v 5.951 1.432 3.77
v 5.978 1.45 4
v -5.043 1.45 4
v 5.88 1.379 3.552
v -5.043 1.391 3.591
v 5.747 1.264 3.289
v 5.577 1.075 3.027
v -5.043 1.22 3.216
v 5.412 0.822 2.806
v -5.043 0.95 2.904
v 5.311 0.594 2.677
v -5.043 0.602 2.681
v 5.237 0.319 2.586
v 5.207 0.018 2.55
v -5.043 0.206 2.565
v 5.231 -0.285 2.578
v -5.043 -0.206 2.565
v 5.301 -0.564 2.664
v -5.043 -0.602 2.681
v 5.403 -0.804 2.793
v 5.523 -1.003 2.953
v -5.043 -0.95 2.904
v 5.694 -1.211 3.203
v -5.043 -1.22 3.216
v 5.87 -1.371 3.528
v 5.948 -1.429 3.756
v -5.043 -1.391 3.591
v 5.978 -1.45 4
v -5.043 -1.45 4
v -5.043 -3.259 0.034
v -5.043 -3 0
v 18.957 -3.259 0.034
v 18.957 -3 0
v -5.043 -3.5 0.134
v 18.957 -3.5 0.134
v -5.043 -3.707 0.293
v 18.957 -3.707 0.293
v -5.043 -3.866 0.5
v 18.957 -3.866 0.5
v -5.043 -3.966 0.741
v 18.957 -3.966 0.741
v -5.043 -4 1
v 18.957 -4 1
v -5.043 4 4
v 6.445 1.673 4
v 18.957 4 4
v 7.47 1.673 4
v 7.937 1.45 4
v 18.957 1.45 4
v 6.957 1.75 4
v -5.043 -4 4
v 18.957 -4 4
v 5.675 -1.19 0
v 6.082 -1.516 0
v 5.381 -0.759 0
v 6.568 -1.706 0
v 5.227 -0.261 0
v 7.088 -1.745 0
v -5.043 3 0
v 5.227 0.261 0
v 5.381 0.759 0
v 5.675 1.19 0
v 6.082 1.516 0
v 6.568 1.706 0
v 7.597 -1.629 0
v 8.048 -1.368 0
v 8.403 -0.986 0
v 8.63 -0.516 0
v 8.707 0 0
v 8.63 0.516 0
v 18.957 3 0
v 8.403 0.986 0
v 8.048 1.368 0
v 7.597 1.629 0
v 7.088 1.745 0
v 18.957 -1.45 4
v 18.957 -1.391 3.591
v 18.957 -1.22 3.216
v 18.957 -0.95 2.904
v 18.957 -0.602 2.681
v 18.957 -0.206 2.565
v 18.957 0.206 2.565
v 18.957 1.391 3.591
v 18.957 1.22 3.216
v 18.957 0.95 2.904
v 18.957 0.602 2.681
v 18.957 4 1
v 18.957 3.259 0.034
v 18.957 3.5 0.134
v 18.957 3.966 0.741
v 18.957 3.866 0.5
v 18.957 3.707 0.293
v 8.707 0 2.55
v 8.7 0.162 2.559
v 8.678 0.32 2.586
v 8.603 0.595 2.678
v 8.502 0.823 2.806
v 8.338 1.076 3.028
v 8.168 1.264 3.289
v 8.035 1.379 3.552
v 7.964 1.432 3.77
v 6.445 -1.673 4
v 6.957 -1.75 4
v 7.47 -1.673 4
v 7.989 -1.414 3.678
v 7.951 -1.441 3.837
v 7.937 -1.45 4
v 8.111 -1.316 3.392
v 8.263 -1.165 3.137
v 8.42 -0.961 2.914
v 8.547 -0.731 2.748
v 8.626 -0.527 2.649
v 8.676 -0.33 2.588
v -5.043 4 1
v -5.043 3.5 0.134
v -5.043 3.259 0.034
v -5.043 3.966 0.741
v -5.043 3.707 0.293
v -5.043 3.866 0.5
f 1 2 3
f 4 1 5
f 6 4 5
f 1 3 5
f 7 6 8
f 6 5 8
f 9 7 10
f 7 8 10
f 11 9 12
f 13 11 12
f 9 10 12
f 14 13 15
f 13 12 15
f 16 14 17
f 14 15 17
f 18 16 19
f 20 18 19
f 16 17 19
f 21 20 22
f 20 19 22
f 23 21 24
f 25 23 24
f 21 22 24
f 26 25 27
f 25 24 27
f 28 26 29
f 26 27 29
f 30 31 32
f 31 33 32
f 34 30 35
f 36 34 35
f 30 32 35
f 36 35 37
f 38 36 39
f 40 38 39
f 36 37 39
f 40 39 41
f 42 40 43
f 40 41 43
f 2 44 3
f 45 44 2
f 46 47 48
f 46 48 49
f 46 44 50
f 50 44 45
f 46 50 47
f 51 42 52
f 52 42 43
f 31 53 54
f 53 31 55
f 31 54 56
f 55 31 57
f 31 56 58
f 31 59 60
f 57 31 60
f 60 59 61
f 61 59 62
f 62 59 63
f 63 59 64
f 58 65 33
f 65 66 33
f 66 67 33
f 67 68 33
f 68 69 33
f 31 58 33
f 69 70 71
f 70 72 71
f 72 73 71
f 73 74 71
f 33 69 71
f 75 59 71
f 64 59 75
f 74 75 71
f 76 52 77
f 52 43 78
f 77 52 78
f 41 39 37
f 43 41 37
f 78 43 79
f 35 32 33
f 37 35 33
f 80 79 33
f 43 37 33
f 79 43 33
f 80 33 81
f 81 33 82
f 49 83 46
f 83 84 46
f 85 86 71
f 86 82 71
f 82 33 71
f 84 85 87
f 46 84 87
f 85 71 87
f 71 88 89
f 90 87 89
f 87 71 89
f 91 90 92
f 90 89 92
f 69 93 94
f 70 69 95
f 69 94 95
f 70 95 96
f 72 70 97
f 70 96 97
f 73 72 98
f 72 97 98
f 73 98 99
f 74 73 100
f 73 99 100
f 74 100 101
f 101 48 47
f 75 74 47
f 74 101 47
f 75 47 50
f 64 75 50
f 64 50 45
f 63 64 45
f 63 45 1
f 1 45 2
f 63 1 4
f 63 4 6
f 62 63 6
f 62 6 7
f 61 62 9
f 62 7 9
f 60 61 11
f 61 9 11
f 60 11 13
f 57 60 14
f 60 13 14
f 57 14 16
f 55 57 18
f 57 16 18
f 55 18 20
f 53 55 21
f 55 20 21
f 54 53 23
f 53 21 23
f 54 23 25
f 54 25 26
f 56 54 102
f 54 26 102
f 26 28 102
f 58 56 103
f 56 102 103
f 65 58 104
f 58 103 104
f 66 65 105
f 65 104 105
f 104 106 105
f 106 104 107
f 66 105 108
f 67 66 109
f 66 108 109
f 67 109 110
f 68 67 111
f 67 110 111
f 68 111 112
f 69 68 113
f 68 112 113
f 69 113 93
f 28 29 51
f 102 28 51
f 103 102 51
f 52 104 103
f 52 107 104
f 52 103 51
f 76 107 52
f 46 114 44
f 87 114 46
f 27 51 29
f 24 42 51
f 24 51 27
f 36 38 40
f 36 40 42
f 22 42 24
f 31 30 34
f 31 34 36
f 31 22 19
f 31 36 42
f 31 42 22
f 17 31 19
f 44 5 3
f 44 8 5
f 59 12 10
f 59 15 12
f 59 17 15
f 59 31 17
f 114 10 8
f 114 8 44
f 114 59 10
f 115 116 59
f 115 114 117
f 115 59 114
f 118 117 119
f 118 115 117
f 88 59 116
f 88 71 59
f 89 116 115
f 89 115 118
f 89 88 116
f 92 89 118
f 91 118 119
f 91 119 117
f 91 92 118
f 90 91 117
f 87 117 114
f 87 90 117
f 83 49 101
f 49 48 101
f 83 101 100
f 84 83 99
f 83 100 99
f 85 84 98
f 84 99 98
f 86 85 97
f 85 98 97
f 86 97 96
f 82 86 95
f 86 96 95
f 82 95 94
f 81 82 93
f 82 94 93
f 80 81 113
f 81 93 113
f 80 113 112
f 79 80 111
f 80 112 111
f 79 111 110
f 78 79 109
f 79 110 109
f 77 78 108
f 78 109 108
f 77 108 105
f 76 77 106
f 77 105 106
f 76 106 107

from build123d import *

# Parameters (mm, degrees)
SKETCH2_W           = 24
SKETCH2_H           = 8
BOSS_EXTRUDE1_DEPTH = 4
SKETCH3_R           = 1.75
CUT_EXTRUDE1_DEPTH  = 5
SKETCH4_R           = 1.45
CUT_EXTRUDE2_DEPTH  = 44
FILLET1_R           = 1


with BuildPart() as part:
    # Sketch2 → Boss-Extrude1 (new body)
    with BuildSketch(Plane.XY):
        with Locations((6.957345972, 0)):
            Rectangle(SKETCH2_W, SKETCH2_H)
    extrude(amount=BOSS_EXTRUDE1_DEPTH)

    # Sketch3 → Cut-Extrude1 (cut)
    with BuildSketch(Plane.XY.offset(4)):
        with Locations((6.957345972, 0)):
            Circle(SKETCH3_R)
    extrude(amount=-CUT_EXTRUDE1_DEPTH, mode=Mode.SUBTRACT)

    # Sketch4 → Cut-Extrude2 (cut)
    with BuildSketch(Plane.ZY.offset(5.042654028)):
        with Locations((4, 0)):
            Circle(SKETCH4_R)
    extrude(amount=-CUT_EXTRUDE2_DEPTH, mode=Mode.SUBTRACT)

    # Fillet1
    fillet1_edges = [part.edges().sort_by_distance(p)[0] for p in [
        (6.957345972, 4, 0),
        (6.957345972, -4, 0),
    ]]
    fillet(fillet1_edges, radius=FILLET1_R)


solid = part.part
